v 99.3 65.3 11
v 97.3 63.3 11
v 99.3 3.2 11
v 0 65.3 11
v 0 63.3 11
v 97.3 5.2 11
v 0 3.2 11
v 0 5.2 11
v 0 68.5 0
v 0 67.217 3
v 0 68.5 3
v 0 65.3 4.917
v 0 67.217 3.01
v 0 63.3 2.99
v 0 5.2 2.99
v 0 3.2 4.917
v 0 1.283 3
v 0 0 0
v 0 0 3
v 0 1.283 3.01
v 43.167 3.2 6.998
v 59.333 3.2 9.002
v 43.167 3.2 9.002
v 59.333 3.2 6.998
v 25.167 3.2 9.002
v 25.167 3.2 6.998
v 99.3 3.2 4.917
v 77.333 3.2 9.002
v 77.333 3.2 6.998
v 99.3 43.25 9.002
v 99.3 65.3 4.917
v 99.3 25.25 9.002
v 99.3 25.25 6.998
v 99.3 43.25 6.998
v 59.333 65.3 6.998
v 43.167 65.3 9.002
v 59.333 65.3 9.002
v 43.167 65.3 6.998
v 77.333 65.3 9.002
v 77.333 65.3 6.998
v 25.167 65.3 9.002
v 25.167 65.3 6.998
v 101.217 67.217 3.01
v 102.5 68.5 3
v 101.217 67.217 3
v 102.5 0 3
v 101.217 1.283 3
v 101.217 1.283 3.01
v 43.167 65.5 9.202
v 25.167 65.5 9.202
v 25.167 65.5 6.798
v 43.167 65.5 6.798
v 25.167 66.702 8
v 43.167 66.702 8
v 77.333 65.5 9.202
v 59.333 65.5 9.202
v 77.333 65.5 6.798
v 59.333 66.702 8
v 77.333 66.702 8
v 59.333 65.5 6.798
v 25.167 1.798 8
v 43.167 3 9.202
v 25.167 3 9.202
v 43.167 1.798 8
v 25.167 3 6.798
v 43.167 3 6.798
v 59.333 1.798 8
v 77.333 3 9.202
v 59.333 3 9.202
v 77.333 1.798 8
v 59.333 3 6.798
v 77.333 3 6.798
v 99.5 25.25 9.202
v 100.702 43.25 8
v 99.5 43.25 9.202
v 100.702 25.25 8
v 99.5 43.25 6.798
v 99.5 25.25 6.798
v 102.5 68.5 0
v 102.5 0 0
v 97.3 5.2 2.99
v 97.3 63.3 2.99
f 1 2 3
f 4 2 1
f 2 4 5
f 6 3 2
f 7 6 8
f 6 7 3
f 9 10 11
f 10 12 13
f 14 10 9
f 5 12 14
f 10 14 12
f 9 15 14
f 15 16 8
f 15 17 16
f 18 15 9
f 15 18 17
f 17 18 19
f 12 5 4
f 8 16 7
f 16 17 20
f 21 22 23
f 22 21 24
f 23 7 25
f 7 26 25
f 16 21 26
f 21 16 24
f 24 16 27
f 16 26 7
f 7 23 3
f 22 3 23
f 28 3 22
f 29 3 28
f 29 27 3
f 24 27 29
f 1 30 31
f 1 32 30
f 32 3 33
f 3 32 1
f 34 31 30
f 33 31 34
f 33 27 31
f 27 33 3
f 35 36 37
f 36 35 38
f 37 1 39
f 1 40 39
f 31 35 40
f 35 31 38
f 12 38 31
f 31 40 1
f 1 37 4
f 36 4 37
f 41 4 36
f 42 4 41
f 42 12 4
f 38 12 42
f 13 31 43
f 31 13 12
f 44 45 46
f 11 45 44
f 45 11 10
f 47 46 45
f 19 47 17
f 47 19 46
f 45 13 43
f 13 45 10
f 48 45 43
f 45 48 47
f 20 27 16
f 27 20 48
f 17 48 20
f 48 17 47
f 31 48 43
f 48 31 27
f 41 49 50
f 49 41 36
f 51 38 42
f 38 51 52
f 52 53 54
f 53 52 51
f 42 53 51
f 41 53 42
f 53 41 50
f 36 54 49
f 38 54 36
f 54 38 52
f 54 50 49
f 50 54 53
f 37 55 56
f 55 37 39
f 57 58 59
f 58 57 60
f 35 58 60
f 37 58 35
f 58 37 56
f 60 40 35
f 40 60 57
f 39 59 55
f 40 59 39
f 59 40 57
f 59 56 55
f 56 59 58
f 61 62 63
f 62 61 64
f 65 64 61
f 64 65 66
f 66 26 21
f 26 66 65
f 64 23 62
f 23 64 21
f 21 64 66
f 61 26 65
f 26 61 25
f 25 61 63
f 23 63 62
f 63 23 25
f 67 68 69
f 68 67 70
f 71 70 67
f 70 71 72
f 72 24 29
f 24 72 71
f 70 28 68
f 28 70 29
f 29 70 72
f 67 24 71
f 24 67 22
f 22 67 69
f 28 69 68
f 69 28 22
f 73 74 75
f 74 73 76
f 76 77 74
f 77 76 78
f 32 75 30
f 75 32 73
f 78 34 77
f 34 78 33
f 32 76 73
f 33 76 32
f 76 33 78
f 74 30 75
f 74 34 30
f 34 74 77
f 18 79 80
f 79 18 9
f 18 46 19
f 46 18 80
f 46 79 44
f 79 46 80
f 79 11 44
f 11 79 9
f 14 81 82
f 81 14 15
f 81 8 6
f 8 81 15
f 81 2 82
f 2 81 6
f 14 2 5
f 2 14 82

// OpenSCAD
// file: ../lib/screws.scad
// ============================================================================
// SCREW SPECIFICATIONS & HOLE API
// ============================================================================
// Complete screw management: specifications, helper functions, and hole masks.
// All geometry starts at origin [0,0,0] - position with translate()
//
// Usage:
//   include <lib/screws.scad>
//
//   difference() {
//       your_part();
//       translate([x, y, z]) screw_hole_mask("M3-16", "front", front_depth=3);
//   }
// ============================================================================

// ============================================================================
// SCREW SPECIFICATIONS
// ============================================================================
// Normalized screw specifications for different sizes
// Format: [name, thread_diameter, pilot_hole_diameter, through_hole_diameter, 
//          head_diameter, head_height, countersink_diameter, countersink_depth, 
//          min_engagement_depth]
//
// Key measurements:
//   thread_diameter       - Nominal screw size (3mm for M3, 4mm for M4, etc.)
//   pilot_hole_diameter   - Hole where screw threads into and grips material (self-tapping)
//   through_hole_diameter - Clearance hole (screw slides through freely, no threading)
//   head_diameter         - Size of screw head (for clearance calculations)
//   head_height           - Thickness of screw head
//   countersink_diameter  - Diameter at top of countersink cone (typically 2× thread diameter)
//   countersink_depth     - Depth of countersink recess for flush mounting
//   min_engagement_depth  - Minimum depth needed for secure threading (typically 2× thread diameter)
pilot_hole_small_thread_factor = 0.98;
pilot_hole_regular_thread_factor = 0.97;
pilot_hole_large_thread_factor = 0.95;
screw_specs = [
  [
    // name
    "M2.5-4",
    // thread_diameter
    2.47,
    // pilot_hole_diameter
    2.47 * pilot_hole_small_thread_factor,
    // through_hole_diameter
    2.5,
    // head_diameter
    5.05,
    // head_height
    0.5,
    // countersink_diameter
    5.5,
    // countersink_depth
    0.4,
    // min_engagement_depth
    4.5,
  ],
  [
    // name
    "M3-16",
    // thread_diameter
    2.9,
    // pilot_hole_diameter
    2.9 * pilot_hole_small_thread_factor,
    // through_hole_diameter
    3.0,
    // head_diameter
    5.5,
    // head_height
    1.8,
    // countersink_diameter
    6.0,
    // countersink_depth
    1.5,
    // min_engagement_depth
    16.0,
  ],
  [
    // name
    "M3-30",
    // thread_diameter
    2.9,
    // pilot_hole_diameter
    2.9 * pilot_hole_small_thread_factor,
    // through_hole_diameter
    3.0,
    // head_diameter
    5.5,
    // head_height
    1.8,
    // countersink_diameter
    6.0,
    // countersink_depth
    1.5,
    // min_engagement_depth
    30.0,
  ],
  [
    // name
    "M3-10",
    // thread_diameter
    2.9,
    // pilot_hole_diameter
    2.9 * pilot_hole_small_thread_factor,
    // through_hole_diameter
    3.0,
    // head_diameter
    5.4,
    // head_height
    1.7,
    // countersink_diameter
    6.0,
    // countersink_depth
    1.4,
    // min_engagement_depth
    10.0,
  ],
  [
    // name
    "M3.5-20",
    // thread_diameter
    3.35,
    // pilot_hole_diameter
    2.6,
    // through_hole_diameter
    3.5,
    // head_diameter
    6.8,
    // head_height
    2.58,
    // countersink_diameter
    7.0,
    // countersink_depth
    2.7,
    // min_engagement_depth
    20,
  ],
  [
    // name
    "M4-50",
    // thread_diameter
    3.9,
    // pilot_hole_diameter
    3.9 * pilot_hole_small_thread_factor,
    // through_hole_diameter
    4.0,
    // head_diameter
    7.25,
    // head_height
    2.55,
    // countersink_diameter
    8.0,
    // countersink_depth
    2.0,
    // min_engagement_depth
    52.0,
  ],
  [
    // name
    "M5-Noctua",
    // thread_diameter
    4.8,
    // pilot_hole_diameter
    4.8 * pilot_hole_regular_thread_factor,
    // through_hole_diameter
    5.0,
    // head_diameter
    7.05,
    // head_height
    1.4,
    // countersink_diameter
    7.5,
    // countersink_depth
    1.5,
    // min_engagement_depth
    10.0,
  ],
];

// Helper functions to retrieve screw specifications
function get_screw_index(name) =
  search([name], screw_specs)[0];

function get_screw_spec(name, property) =
  let (
    idx = get_screw_index(name),
    spec = screw_specs[idx]
  ) property == "name" ? spec[0]
  : property == "thread_diameter" ? spec[1]
  : property == "pilot_hole_diameter" ? spec[2]
  : property == "through_hole_diameter" ? spec[3]
  : property == "head_diameter" ? spec[4]
  : property == "head_height" ? spec[5]
  : property == "countersink_diameter" ? spec[6]
  : property == "countersink_depth" ? spec[7]
  : property == "min_engagement_depth" ? spec[8]
  : undef;

// ============================================================================
// SCREW HOLE MASK

// ============================================================================
// SCREW HOLE MASK
// ============================================================================
// Creates a complete screw hole mask for boolean difference operations.
//
// Parameters:
//   screw       - Screw size name from screw_specs ("M3-16", "M4", "M5")
//   type        - "front" (countersink + pass-through)
//                 "back"  (pilot hole only)
//                 "through" (pass-through hole only, no countersink)
//                 "both"  (complete assembly for preview)
//   front_depth - Depth of pass-through section (material thickness)
//   back_depth  - Depth of pilot hole (thread engagement)
//
// Geometry:
//   Z=0 is at the countersink top surface (screw head flush point)
//   Front section extends from Z=0 to Z=-front_depth
//   Back section extends from Z=-front_depth to Z=-(front_depth+back_depth)
//
//        ┌─────────┐  Z=0 (countersink top)
//         ╲       ╱   countersink cone
//          │     │    pass-through hole
//   ───────┴─────┴─── Z=-front_depth (interface)
//           │   │     pilot hole (narrower)
//           └───┘     Z=-(front_depth+back_depth)

module screw_hole_mask(screw = "M3-16", type = "both") {
  // Get screw specifications
  through_d = get_screw_spec(screw, "through_hole_diameter");
  pilot_d = get_screw_spec(screw, "pilot_hole_diameter");
  csink_d = get_screw_spec(screw, "countersink_diameter");
  csink_depth = get_screw_spec(screw, "countersink_depth");
  min_engagement_depth = get_screw_spec(screw, "min_engagement_depth");

  eps = 0.01; // Small value for clean boolean operations

  // Front section: countersink + pass-through hole
  if (type == "front" || type == "both") {
    // Countersink cone (top of screw head)
    translate([0, 0, -csink_depth])
      cylinder(d1=through_d, d2=csink_d, h=csink_depth + eps, $fn=30);

    // Pass-through hole (screw shaft clearance)
    translate([0, 0, -min_engagement_depth - eps])
      cylinder(d=through_d, h=min_engagement_depth - csink_depth + 2 * eps, $fn=30);
  }

  // Through hole only (no countersink)
  if (type == "through") {
    translate([0, 0, -min_engagement_depth - eps])
      cylinder(d=through_d, h=min_engagement_depth + 2 * eps, $fn=30);
  }

  // Back section: pilot hole (threads grip here)
  if (type == "back" || type == "both") {
    translate([0, 0, -min_engagement_depth - eps])
      cylinder(d=pilot_d, h=min_engagement_depth + 4 * eps, $fn=30);
  }
}

// ============================================================================
// HELPER: Get all hole diameters for a screw size
// ============================================================================
// Returns [through_hole_d, pilot_hole_d, countersink_d]
function get_screw_holes(screw) =
  [
    get_screw_spec(screw, "through_hole_diameter"),
    get_screw_spec(screw, "pilot_hole_diameter"),
    get_screw_spec(screw, "countersink_diameter"),
  ];
// file: ../lib/clips.scad
// ============================================================================
// CLIPS — hexrack's 45-degree rib into a groove
// ============================================================================
// hexrack's dust-filter clip, used for every clipped joint here: modules to each
// other, the lid to the top module, the filter to the front face.
//
// A joint is [name, centre, axis, length]:
//   centre - the rib's axis ON THE JOINT PLANE (the mating part's face), in the frame
//            of the part that carries the rib
//   axis   - "x", "y" or "z": the direction the rib runs
//
// ONE POSITION PER JOINT. The part with the rib and the part with the groove both read
// the same row; hexrack once had a groove anchored to a different datum than its rib,
// 9mm away, and both parts still exported clean. scripts/test-clips.sh checks every row.
//
// The rib is a square section turned 45 degrees and centred on the joint plane, so
// half of it stands proud into the mate's groove. The groove is the same diamond grown
// by clip_clear, so at rest the rib touches nothing.
// ============================================================================

include <../config.scad>

module clipDiamond(axis, len, side) {
  if (axis == "x")      rotate([45, 0, 0]) cube([len, side, side], center = true);
  else if (axis == "y") rotate([0, 45, 0]) cube([side, len, side], center = true);
  else                  rotate([0, 0, 45]) cube([side, side, len], center = true);
}

module clipRib(j) {
  translate(j[1]) clipDiamond(j[2], j[3], clip_rib);
}

// clip_rib*sqrt(2)/2 is the half-diagonal, so growing it by clip_clear means growing
// the side by clip_clear*sqrt(2).
module clipGroove(j) {
  translate(j[1]) clipDiamond(j[2], j[3] + 2 * clip_clear, clip_rib + sqrt(2) * clip_clear);
}
// file: ../lib/stacking.scad
// ============================================================================
// STACKING — the spigot, the socket, the lap between them, and the dovetail rails
// ============================================================================
// Everything two stacked parts have to agree on lives here, once:
//
//   spigotSolid()  the bottom band of every module and of the lid
//   socketLap()    the bevel cut into the top of every module's walls
//   spigotJoints() the clip ribs on a spigot; the SAME rows, raised by module_pitch,
//                  are the grooves in the socket of the module below
//   dovetailProfile() the rails on the modules and the channels in the front face
//
// All in the MODULE frame: x=0 the open front edge, y=0 the -Y outer face, z=0 the
// spigot's bottom. See config.scad.
// ============================================================================

include <../config.scad>
include <clips.scad>

// ----------------------------------------------------------------------------
// OUTLINES
// ----------------------------------------------------------------------------

// The module's footprint inset by d on its three walls -- -Y, +Y and the +X rear.
// The front is open, so the front edge stays put; front_ext pushes it forward for
// cutters that must run out through it.
module insetRect(d, front_ext = 0) {
  translate([-front_ext, d]) square([module_l - d + front_ext, module_w - 2 * d]);
}

// A wafer of a 2D outline at height z: hull() between two of these is a frustum,
// exact for the convex rectangles above.
module waferAt(z) {
  translate([0, 0, z]) linear_extrude(EPS) children();
}

// ----------------------------------------------------------------------------
// SPIGOT — the bottom band, solid; the owner cuts its own cavity
// ----------------------------------------------------------------------------
// A straight band inset spigot_inset from the outer faces, then the 45-degree lap out
// to lap_inset0 at spigot_h. Above spigot_h the owner's full outline takes over, so
// the land's underside -- lap_inset0 wide -- is the only thing printed over air.
module spigotSolid() {
  z_lap = spigot_h - lap_h;
  linear_extrude(z_lap + EPS) insetRect(spigot_inset);
  hull() {
    waferAt(z_lap) insetRect(spigot_inset);
    waferAt(spigot_h - EPS) insetRect(lap_inset0);
  }
}

// The spigot ring's inside, from z0 up to spigot_h. A module starts it at its floor's
// top; the lid is hollow all the way down.
module spigotCavity(z0) {
  translate([0, 0, z0])
    linear_extrude(spigot_h - z0 + EPS) insetRect(spigot_inset + spigot_t, 1);
}

// ----------------------------------------------------------------------------
// SOCKET — the top of every module's walls
// ----------------------------------------------------------------------------
// The inside of the walls opens at 45 degrees from the wall's inner face up to a
// stack_land-wide flat at module_h. Carried past module_h at the same slope, so the
// cut runs out through the top rather than meeting it face to face.
module socketLap() {
  hull() {
    waferAt(module_h - (wall - stack_land)) insetRect(wall, 1);
    waferAt(module_h + 1) insetRect(stack_land - 1, 1);
  }
}

// ----------------------------------------------------------------------------
// CLIP JOINTS
// ----------------------------------------------------------------------------
// Ribs on the spigot's outer faces, centred on the plane of the lower module's inner
// wall face. Two per side wall, one on the rear. None on the front: it is open.
function spigotJoints() =
  let (yl = wall, yr = module_w - wall, xr = module_l - wall, z = clip_z)
  [ ["left-a",  [module_l / 3,     yl, z], "x", clip_rib_len],
    ["left-b",  [2 * module_l / 3, yl, z], "x", clip_rib_len],
    ["right-a", [module_l / 3,     yr, z], "x", clip_rib_len],
    ["right-b", [2 * module_l / 3, yr, z], "x", clip_rib_len],
    ["rear",    [xr, module_w / 2,     z], "y", clip_rib_len] ];

// The same joint, seen from the module below: its groove, in its own frame.
function socketJoint(j) = [j[0], j[1] + [0, 0, module_pitch], j[2], j[3]];

module spigotRibs()    { for (j = spigotJoints()) clipRib(j); }
module socketGrooves() { for (j = spigotJoints()) clipGroove(socketJoint(j)); }

// ----------------------------------------------------------------------------
// DOVETAILS
// ----------------------------------------------------------------------------
// One rail's section in the XY plane, for the -Y side: root on the wall's outer face
// at y = 0, flaring to dovetail_tip_w at y = -dovetail_d. The root runs OVERLAP into
// the wall so the rail is fused to it, not tangent to it.
module dovetailProfile(grow = 0) {
  hr = dovetail_w / 2;
  ht = dovetail_tip_w / 2;
  offset(delta = grow)
    translate([dovetail_x, 0])
      polygon([[-hr, OVERLAP], [hr, OVERLAP], [ht, -dovetail_d], [-ht, -dovetail_d]]);
}

// Both sides: the +Y one is the -Y one mirrored about the module's centre line.
module bothSides() {
  children();
  translate([0, module_w, 0]) mirror([0, 1, 0]) children();
}

// A module's male rails: from spigot_h, where the full wall starts, to module_h. The
// bottom rises at 45 degrees off the wall face -- below it is the inset spigot band,
// so a square end would be a 2.5mm ledge over air.
module dovetailRails() {
  bothSides() {
    hull() {
      waferAt(spigot_h)
        intersection() {
          dovetailProfile();
          translate([-1, -EPS]) square([module_l, OVERLAP + EPS]);
        }
      waferAt(spigot_h + dovetail_d) dovetailProfile();
    }
    translate([0, 0, spigot_h + dovetail_d])
      linear_extrude(module_h - spigot_h - dovetail_d) dovetailProfile();
  }
}
// main file
// ============================================================================
// LID — closes the top module
// ============================================================================
// A module's spigot with a plate on it instead of a module: it drops into the top
// module's socket, clips there on the same ribs, and sits on the same land. Solid: a
// lid with holes in it drops dust straight onto the top board.
//
// PRINTED UPSIDE DOWN, plate on the bed: the spigot's lap then narrows as it rises and
// the ribs are diamonds on a vertical face. lidPrint() is that orientation; lidPart()
// is the lid as it sits, for the assembly and the fit tests.
// ============================================================================

include <../lib/stacking.scad>

module lidPart() {
  difference() {
    union() {
      spigotSolid();
      translate([0, 0, spigot_h]) linear_extrude(lid_t) square([module_l, module_w]);
      spigotRibs();
    }
    spigotCavity(-EPS);
  }
}

// Rx(180) sends z to -z and y to -y; the translate puts it back on the bed.
module lidPrint() {
  translate([0, module_w, spigot_h + lid_t]) rotate([180, 0, 0]) lidPart();
}

lidPrint();
